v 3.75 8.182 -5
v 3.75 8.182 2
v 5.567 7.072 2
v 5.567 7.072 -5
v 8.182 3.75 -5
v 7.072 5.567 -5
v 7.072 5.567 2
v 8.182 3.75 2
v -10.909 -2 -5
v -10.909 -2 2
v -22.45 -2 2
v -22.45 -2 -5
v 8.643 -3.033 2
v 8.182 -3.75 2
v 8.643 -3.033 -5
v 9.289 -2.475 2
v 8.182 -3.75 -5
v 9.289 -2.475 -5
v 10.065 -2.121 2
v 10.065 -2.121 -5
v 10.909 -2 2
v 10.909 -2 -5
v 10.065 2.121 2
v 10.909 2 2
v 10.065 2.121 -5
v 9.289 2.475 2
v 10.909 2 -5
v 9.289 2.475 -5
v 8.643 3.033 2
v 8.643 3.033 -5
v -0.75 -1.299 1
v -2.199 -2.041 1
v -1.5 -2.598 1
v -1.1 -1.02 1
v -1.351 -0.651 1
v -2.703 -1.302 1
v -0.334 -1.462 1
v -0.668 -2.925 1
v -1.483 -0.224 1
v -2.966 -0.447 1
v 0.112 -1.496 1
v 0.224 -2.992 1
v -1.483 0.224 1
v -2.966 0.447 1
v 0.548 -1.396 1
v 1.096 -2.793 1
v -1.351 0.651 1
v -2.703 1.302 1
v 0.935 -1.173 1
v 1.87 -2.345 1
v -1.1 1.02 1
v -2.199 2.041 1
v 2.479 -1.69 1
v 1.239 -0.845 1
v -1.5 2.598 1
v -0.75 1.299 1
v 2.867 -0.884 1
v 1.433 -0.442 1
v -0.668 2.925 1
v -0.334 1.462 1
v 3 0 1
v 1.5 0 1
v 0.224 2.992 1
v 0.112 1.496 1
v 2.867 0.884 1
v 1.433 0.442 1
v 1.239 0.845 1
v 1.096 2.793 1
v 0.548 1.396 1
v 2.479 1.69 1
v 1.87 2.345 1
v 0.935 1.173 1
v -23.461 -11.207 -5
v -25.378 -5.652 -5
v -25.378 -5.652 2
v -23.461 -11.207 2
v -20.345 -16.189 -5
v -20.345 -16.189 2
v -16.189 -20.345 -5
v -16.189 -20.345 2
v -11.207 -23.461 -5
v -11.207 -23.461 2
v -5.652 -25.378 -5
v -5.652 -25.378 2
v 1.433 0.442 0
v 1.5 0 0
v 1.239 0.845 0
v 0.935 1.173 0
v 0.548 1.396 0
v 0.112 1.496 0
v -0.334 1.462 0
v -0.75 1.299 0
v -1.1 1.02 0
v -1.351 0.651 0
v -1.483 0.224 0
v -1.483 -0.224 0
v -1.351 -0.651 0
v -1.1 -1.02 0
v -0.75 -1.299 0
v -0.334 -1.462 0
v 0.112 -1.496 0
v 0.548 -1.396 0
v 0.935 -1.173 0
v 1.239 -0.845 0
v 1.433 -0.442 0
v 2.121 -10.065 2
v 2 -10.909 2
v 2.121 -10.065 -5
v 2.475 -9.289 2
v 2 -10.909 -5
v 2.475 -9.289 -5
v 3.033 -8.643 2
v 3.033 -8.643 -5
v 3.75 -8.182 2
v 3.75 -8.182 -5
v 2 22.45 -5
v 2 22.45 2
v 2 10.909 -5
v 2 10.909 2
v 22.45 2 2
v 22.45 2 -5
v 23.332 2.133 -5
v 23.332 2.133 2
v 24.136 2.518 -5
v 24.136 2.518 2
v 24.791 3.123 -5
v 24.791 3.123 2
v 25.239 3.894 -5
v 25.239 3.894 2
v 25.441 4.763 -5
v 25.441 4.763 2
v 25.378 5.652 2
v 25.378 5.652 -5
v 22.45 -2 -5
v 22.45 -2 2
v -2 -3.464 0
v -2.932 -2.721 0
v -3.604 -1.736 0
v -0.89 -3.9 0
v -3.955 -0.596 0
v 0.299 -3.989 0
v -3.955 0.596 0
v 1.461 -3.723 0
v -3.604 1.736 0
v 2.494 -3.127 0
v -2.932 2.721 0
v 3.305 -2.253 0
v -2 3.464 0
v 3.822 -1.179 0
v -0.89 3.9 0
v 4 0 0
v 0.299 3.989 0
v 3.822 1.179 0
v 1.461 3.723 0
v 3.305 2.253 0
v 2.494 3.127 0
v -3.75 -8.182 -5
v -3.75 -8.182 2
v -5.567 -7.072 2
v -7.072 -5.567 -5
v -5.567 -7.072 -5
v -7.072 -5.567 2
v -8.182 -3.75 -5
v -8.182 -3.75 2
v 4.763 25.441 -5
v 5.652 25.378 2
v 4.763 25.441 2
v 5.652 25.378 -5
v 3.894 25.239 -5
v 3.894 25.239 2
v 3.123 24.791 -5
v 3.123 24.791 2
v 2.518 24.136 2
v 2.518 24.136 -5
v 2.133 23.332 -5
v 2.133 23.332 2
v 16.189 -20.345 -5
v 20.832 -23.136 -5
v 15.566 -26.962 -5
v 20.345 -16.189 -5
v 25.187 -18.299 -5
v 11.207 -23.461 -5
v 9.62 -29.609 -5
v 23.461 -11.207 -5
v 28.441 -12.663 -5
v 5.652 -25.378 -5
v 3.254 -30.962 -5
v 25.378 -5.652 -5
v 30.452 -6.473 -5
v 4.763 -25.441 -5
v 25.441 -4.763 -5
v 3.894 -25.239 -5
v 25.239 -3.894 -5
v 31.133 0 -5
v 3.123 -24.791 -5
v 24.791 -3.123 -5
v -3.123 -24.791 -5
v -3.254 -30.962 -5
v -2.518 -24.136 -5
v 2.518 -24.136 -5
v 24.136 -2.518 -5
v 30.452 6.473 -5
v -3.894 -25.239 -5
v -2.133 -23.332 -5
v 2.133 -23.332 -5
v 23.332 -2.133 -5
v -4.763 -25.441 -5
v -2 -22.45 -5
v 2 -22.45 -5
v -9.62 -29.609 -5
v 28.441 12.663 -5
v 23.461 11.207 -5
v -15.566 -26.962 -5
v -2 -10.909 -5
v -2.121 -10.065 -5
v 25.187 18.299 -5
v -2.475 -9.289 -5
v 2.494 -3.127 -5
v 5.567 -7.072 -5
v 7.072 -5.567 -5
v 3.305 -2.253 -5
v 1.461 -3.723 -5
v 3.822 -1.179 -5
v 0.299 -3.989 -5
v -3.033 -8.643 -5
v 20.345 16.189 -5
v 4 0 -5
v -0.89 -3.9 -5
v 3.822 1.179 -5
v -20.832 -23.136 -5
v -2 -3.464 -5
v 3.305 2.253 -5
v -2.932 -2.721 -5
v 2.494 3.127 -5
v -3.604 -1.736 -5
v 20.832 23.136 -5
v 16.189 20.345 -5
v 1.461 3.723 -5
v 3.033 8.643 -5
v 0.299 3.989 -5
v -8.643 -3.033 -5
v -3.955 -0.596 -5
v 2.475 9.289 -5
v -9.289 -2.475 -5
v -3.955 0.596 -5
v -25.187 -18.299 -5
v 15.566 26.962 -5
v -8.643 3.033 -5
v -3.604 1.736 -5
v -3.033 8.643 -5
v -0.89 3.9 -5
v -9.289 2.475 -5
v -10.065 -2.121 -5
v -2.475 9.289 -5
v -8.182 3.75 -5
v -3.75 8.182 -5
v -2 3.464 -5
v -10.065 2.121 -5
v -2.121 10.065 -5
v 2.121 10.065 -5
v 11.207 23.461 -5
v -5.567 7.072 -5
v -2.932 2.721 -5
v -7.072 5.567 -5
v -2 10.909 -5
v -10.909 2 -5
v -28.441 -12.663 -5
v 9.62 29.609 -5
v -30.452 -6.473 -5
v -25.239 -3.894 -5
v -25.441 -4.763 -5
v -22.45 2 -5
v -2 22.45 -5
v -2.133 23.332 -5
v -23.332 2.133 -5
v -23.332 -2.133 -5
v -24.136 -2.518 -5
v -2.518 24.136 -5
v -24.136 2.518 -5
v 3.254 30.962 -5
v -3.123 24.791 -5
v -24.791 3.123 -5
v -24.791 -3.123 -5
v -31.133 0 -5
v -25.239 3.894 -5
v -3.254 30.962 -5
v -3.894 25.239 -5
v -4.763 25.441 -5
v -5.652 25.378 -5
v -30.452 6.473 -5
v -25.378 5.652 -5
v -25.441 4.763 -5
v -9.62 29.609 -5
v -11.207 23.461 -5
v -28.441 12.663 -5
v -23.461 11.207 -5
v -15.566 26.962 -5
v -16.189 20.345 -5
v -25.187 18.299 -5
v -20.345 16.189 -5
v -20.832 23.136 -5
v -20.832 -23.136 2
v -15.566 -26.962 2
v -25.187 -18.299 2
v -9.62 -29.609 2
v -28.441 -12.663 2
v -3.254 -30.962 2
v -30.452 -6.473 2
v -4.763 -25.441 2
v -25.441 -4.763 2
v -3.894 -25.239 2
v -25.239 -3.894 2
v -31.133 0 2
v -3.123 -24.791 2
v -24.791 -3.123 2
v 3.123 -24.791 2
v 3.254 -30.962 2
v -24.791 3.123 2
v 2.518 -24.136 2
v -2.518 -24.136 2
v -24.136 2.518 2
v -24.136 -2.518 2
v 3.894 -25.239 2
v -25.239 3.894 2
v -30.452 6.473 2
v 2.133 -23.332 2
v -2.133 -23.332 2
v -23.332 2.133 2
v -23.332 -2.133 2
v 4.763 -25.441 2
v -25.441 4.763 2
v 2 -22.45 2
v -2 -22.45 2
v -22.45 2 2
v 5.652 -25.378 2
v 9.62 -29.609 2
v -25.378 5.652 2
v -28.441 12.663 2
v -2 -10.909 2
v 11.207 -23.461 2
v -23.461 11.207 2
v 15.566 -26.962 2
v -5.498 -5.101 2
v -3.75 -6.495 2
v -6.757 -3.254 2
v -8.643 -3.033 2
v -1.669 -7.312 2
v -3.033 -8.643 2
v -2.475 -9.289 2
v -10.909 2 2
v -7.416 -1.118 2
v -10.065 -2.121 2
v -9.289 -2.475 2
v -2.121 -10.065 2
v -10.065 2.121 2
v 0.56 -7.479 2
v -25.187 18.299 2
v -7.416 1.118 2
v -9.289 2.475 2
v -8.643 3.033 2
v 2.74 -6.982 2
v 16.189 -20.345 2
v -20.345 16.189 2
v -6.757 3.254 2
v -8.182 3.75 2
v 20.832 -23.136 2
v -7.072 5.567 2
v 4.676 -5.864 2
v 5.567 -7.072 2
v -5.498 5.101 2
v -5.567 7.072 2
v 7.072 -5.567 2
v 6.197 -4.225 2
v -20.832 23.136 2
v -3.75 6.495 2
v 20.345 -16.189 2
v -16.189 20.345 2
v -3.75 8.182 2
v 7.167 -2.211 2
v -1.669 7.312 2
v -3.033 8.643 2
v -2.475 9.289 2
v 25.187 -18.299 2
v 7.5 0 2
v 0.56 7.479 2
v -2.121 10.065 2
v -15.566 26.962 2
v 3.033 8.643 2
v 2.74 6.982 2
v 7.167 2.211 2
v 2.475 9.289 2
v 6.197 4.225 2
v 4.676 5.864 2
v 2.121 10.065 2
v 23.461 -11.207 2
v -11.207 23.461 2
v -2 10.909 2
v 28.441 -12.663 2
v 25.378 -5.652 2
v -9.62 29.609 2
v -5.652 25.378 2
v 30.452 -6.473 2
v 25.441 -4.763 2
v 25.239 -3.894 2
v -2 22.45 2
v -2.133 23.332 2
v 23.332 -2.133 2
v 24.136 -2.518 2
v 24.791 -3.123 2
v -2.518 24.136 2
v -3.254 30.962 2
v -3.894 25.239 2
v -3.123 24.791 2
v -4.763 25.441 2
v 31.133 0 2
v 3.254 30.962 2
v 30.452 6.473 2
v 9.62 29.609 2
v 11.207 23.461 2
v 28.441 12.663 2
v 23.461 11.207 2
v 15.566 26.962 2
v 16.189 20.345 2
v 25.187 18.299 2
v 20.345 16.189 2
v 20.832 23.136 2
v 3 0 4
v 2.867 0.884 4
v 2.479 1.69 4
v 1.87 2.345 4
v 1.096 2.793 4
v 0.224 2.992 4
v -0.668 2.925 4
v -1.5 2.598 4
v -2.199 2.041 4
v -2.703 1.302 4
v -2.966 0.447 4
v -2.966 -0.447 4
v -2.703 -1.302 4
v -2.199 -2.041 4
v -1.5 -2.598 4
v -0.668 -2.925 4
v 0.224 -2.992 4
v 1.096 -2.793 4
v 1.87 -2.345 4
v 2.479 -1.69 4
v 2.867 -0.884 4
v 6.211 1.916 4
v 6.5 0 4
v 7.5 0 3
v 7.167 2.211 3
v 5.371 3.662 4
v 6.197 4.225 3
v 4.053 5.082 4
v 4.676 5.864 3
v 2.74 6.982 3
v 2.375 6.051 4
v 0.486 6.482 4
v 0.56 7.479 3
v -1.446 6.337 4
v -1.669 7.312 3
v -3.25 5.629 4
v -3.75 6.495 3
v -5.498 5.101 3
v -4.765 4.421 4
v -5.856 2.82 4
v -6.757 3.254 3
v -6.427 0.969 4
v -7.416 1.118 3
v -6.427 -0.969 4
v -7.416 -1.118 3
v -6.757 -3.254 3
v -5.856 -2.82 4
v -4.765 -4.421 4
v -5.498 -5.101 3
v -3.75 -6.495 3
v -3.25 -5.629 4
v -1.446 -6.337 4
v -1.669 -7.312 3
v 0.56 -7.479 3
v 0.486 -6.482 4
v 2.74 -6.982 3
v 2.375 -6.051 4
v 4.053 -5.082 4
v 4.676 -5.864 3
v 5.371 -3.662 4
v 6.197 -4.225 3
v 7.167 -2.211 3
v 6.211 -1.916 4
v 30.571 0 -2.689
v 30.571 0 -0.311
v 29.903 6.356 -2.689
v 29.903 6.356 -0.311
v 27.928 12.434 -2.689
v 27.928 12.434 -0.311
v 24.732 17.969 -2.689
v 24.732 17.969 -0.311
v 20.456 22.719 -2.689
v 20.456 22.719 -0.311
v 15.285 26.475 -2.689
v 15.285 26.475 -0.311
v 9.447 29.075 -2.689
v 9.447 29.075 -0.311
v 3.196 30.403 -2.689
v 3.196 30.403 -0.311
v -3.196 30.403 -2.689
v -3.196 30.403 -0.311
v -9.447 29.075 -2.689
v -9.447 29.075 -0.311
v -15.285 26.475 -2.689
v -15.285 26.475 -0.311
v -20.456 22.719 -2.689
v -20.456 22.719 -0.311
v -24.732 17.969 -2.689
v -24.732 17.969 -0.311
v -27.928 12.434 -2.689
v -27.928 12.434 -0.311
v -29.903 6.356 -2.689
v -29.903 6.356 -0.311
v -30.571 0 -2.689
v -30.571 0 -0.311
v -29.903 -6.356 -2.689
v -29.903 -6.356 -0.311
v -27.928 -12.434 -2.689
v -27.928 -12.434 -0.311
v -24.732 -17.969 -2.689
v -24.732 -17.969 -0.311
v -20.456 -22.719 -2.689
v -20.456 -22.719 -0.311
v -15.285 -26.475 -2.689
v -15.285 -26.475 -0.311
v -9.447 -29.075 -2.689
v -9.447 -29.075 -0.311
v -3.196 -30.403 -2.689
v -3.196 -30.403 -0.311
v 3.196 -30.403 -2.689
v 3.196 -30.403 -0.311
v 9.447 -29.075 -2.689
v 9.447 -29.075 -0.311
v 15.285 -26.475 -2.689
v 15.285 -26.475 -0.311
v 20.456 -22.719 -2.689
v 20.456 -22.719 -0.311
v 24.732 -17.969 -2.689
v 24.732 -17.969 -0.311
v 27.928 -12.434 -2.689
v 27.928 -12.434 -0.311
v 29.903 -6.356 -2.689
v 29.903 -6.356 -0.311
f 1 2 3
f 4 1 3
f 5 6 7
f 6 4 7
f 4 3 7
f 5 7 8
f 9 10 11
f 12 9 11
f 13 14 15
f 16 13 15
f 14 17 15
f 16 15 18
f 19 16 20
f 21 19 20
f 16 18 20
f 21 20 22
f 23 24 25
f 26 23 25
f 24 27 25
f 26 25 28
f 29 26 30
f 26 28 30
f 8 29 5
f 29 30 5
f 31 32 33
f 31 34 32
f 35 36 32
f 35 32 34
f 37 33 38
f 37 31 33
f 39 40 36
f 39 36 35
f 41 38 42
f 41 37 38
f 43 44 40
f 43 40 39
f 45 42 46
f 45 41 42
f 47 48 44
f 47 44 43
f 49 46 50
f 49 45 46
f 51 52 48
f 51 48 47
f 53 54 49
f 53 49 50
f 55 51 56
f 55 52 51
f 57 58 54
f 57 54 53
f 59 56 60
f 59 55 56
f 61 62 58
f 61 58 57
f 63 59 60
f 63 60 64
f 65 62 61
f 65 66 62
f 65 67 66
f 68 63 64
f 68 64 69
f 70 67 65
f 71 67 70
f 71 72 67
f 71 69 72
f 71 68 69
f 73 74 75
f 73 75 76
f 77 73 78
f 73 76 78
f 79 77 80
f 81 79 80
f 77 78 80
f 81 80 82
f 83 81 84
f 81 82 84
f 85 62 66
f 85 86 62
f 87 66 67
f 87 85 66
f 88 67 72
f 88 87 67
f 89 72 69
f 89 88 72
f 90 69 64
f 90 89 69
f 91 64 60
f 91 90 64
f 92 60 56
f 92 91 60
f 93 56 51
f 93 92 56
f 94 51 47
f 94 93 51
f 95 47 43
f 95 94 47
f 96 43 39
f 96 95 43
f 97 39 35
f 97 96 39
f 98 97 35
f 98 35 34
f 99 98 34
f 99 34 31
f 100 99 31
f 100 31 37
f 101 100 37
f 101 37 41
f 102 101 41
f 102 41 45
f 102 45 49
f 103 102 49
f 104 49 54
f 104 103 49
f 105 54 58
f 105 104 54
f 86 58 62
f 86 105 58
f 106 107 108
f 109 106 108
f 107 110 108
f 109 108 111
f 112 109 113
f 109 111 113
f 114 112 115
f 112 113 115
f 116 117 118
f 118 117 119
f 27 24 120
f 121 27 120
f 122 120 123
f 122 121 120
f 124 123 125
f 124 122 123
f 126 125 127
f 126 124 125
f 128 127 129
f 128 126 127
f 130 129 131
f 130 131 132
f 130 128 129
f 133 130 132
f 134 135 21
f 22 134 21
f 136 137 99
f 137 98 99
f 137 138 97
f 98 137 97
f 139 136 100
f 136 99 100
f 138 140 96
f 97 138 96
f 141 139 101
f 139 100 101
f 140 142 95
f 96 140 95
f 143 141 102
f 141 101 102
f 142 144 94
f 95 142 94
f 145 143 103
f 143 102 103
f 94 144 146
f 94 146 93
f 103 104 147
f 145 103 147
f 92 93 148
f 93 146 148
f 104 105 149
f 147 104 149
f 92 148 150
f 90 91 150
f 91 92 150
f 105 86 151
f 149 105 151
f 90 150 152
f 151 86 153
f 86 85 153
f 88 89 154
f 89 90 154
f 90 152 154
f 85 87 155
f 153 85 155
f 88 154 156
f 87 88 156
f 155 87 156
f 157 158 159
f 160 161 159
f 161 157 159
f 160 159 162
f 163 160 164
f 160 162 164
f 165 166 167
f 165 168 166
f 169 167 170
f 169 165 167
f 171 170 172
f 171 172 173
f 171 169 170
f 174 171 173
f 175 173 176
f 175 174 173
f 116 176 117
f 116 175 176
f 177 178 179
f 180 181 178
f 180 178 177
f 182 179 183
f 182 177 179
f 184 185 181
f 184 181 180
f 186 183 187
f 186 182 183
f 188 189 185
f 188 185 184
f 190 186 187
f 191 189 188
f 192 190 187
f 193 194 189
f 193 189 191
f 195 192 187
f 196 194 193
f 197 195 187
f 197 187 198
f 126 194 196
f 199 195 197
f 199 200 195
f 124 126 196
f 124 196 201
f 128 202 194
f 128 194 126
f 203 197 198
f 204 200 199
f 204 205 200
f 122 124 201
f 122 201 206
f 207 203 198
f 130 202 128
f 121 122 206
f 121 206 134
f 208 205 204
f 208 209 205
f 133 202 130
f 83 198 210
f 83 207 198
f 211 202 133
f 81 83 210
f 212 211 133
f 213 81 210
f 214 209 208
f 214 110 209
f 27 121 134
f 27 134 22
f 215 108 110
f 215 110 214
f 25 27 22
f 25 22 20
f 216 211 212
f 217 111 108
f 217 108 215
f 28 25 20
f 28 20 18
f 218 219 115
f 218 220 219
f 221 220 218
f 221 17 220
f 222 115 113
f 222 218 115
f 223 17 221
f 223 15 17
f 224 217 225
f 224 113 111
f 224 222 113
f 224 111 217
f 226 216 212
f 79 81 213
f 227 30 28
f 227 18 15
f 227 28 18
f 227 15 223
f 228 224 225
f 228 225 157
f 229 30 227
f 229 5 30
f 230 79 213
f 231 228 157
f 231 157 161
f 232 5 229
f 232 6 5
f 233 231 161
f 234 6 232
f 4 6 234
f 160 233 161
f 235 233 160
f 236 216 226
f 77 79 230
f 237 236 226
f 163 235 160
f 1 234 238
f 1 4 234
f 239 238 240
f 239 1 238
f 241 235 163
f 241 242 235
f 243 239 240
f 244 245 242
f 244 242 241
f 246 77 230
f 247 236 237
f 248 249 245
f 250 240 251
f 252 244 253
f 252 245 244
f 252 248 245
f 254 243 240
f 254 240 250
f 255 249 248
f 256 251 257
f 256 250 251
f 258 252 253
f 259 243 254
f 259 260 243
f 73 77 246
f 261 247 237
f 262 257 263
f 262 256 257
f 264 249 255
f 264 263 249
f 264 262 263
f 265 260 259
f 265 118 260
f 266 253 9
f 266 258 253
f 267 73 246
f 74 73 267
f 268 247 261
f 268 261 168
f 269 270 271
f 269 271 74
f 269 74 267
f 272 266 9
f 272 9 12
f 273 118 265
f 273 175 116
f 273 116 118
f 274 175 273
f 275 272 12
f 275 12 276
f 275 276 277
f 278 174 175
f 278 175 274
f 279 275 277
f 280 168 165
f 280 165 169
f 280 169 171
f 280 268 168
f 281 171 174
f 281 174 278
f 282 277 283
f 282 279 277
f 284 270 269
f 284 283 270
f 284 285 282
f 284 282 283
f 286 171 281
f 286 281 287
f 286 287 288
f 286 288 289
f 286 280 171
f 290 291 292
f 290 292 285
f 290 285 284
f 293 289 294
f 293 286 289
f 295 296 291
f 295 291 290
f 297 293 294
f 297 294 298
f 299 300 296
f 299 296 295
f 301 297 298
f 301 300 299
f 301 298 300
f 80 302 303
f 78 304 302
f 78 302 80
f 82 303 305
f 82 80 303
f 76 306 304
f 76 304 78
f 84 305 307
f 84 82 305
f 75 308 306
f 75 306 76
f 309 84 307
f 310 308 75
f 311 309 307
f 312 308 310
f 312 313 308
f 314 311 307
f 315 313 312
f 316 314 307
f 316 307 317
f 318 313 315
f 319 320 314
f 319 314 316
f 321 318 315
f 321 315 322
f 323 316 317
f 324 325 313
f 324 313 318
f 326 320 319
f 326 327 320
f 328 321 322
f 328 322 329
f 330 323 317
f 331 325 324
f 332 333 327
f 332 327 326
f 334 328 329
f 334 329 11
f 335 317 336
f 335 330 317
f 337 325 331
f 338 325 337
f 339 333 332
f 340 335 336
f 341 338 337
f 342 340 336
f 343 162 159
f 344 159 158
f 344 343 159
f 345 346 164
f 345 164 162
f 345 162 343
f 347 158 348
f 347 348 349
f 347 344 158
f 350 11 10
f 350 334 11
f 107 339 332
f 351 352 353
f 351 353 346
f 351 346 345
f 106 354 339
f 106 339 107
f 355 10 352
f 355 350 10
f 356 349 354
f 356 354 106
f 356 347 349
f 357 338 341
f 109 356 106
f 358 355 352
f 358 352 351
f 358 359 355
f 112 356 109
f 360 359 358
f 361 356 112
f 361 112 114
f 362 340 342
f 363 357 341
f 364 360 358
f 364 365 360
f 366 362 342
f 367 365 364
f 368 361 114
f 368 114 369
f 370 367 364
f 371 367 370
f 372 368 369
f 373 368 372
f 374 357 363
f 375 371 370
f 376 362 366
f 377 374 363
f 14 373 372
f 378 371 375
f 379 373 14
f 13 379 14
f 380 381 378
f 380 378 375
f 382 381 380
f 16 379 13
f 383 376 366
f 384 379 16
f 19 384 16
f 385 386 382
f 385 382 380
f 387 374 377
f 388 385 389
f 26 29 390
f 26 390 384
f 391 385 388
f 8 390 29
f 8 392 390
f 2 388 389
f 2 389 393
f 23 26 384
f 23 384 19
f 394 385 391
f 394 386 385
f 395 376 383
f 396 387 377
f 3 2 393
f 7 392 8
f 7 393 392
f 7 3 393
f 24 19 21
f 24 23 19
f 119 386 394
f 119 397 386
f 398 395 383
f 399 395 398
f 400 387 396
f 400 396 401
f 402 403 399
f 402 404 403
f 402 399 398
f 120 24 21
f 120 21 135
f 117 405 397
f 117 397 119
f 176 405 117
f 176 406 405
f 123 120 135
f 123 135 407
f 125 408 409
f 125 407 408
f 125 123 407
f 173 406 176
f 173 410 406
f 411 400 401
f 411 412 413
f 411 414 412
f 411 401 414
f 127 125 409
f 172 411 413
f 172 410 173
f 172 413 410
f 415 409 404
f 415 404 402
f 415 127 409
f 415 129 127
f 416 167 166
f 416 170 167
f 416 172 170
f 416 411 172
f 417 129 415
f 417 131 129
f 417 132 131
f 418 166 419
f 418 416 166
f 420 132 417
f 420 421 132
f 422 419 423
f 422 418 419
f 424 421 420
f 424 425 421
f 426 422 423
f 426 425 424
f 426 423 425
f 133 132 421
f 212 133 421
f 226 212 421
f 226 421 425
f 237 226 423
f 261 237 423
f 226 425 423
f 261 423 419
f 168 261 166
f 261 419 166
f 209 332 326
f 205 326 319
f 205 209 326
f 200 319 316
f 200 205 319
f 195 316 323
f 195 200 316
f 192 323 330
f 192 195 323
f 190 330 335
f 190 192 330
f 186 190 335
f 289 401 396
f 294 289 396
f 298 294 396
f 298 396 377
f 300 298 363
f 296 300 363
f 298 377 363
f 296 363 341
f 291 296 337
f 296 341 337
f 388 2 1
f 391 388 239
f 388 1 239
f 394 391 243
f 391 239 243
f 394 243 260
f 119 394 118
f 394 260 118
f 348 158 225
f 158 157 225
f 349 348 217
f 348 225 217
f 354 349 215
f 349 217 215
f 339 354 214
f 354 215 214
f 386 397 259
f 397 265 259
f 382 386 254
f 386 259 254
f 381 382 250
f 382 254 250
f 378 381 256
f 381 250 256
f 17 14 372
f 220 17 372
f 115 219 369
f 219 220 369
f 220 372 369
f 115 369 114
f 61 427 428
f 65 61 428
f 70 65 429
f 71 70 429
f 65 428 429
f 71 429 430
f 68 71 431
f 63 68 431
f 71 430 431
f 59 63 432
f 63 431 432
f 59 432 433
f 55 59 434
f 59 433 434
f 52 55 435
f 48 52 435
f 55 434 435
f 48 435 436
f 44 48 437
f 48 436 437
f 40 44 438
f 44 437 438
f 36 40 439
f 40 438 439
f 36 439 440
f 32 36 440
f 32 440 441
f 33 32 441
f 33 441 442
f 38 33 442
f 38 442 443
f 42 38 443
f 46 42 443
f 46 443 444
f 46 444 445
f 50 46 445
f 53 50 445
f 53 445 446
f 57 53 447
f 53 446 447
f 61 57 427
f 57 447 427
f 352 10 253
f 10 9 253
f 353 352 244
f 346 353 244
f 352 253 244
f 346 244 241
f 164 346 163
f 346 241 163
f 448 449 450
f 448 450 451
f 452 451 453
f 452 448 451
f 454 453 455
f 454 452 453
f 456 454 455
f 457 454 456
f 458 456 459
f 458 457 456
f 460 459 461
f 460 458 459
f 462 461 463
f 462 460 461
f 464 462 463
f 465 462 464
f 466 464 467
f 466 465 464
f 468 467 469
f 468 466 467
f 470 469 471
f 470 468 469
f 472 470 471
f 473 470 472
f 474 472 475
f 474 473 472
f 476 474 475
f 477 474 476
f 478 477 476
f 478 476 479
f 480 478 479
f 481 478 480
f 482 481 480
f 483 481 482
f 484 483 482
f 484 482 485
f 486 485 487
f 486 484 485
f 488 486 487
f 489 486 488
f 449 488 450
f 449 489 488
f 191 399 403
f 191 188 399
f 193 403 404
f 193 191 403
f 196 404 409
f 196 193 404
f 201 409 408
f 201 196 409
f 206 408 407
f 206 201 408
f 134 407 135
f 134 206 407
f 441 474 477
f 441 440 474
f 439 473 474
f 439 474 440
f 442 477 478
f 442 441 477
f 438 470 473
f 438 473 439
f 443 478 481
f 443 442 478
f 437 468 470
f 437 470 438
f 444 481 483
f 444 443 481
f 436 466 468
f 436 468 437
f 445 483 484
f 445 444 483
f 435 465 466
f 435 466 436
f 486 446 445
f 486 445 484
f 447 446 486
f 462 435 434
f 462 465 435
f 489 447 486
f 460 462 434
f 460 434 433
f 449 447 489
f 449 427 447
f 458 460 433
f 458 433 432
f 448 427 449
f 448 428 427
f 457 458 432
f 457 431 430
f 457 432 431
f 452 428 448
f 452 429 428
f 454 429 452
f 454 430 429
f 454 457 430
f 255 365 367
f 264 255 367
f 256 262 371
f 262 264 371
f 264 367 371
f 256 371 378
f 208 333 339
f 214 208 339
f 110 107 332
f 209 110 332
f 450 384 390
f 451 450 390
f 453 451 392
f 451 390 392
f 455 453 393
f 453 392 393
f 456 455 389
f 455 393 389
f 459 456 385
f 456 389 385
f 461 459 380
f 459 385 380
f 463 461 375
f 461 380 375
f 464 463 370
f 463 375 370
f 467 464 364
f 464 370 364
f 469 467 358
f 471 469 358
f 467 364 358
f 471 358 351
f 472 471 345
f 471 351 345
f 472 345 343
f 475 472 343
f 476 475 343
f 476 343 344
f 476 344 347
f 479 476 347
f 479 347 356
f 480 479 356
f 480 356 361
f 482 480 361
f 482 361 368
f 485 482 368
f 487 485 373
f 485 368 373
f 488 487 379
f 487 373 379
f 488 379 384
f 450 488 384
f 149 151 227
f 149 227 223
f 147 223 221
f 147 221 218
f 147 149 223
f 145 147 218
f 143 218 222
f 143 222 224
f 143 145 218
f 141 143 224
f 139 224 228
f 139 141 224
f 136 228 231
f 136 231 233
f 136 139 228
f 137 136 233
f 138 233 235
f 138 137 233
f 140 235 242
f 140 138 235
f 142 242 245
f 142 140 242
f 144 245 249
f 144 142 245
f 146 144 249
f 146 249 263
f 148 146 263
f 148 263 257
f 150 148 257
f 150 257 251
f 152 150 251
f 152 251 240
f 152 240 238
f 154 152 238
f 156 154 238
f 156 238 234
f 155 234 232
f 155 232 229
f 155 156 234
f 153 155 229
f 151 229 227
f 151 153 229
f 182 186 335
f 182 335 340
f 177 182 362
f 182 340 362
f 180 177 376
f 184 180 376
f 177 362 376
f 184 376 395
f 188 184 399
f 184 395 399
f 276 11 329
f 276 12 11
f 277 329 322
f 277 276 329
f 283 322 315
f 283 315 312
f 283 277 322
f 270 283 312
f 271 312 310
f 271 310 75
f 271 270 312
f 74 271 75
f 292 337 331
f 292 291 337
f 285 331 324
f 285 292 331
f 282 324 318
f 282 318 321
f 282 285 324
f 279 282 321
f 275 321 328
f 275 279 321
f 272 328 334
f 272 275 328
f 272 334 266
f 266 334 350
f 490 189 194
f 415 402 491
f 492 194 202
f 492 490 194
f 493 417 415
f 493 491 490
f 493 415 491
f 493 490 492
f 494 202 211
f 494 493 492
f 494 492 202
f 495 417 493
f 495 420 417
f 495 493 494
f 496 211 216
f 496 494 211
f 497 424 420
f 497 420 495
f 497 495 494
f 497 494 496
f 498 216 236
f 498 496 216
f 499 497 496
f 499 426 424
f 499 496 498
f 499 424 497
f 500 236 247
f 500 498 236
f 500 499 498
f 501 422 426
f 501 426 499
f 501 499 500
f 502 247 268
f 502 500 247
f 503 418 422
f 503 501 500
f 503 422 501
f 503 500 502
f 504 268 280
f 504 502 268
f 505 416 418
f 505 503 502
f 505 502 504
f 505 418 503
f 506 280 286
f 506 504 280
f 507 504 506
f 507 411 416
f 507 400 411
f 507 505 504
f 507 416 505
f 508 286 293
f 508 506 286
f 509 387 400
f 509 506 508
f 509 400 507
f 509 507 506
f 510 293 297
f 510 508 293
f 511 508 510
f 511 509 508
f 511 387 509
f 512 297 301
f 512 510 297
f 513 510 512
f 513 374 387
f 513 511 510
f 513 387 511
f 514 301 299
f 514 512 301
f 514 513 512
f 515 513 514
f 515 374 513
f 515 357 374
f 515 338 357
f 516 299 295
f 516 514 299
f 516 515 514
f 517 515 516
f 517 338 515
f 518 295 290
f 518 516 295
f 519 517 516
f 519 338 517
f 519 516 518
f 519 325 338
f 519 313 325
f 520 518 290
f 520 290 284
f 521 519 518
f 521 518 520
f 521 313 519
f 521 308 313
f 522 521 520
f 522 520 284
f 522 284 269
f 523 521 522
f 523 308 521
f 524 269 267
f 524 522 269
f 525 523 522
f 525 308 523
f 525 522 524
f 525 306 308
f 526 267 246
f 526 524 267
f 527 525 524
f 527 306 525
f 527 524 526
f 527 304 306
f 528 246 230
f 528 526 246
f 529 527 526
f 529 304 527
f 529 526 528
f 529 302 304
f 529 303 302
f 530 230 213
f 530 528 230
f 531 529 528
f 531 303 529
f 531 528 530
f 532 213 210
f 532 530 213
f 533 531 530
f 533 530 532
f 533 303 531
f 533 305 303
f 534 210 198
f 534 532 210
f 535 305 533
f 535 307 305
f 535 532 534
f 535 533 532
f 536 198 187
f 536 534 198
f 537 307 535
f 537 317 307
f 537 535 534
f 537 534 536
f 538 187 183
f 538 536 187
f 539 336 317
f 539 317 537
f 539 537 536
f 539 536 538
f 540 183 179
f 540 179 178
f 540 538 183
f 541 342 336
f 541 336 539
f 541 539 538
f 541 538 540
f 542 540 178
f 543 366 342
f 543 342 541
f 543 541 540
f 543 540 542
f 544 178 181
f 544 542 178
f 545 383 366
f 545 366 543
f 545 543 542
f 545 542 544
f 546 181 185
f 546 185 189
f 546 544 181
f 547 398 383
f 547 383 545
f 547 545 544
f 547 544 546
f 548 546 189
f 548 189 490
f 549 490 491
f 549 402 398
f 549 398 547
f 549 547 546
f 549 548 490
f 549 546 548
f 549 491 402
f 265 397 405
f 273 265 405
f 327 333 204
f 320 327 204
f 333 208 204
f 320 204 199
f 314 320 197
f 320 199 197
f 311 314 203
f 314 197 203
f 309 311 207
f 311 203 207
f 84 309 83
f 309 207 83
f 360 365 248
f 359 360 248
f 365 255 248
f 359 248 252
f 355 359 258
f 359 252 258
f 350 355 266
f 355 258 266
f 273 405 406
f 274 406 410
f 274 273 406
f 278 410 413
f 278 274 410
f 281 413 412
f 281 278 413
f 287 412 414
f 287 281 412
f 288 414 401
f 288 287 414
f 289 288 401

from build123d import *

# Parameters (mm, degrees)
F0_R             = 30
F0_R_2           = 1.5
F1_DEPTH         = 2
F2_R             = 7.5
F2_R_2           = 1.5
F3_DEPTH         = 2
F4_R             = 3
F4_R_2           = 1.5
F5_DEPTH         = 3
F6_SIZE          = 1
F7_R             = 30
F7_R_2           = 4
F8_DEPTH         = 5
F10_DEPTH        = 25
F10_COPIES_COUNT = 4
F11_R            = 3


# Not quite as in the source:
# - a pattern or mirror of a feature is missing from the dataset's text; its kind, count and spacing are read off the source's solid


with BuildPart() as f1:
    # F0 (on Top) → F1 (new body)
    with BuildSketch(Plane.XY):
        Circle(F0_R)
        Circle(F0_R_2, mode=Mode.SUBTRACT)
    extrude(amount=F1_DEPTH)

    # F2 (on face) → F3 (join)
    with BuildSketch(Plane.XY.offset(2)):
        Circle(F2_R)
        Circle(F2_R_2, mode=Mode.SUBTRACT)
    extrude(amount=F3_DEPTH)

    # F4 (on face) → F5 (cut)
    with BuildSketch(Plane.XY.offset(4)):
        Circle(F4_R)
        Circle(F4_R_2, mode=Mode.SUBTRACT)
    extrude(amount=-F5_DEPTH, mode=Mode.SUBTRACT)

    # F6
    f6_edges = [f1.edges().sort_by_distance(p)[0] for p in [
        (-7.5, 0, 4),
    ]]
    chamfer(f6_edges, length=F6_SIZE)

    # F7 (on face) → F8 (join)
    with BuildSketch(Plane(origin=(0, 0, 0), x_dir=(1, 0, 0), z_dir=(0, 0, -1))):
        Circle(F7_R)
        Circle(F7_R_2, mode=Mode.SUBTRACT)
    extrude(amount=F8_DEPTH)

    # F9 (on face) → F10 (cut)
    with BuildSketch(Plane.XY.offset(2)):
        with BuildLine():
            Line((2, -8.7749643874), (2, -25.9229627936))
            ThreePointArc((2, -25.9229627936), (18.3847763109, -18.3847763109), (25.9229627936, -2))
            Line((25.9229627936, -2), (8.7749643874, -2))
            ThreePointArc((8.7749643874, -2), (6.3639610307, -6.3639610307), (2, -8.7749643874))
        make_face()
    f10 = extrude(amount=-F10_DEPTH, mode=Mode.SUBTRACT)

    # F10_copies: F10 ×4 about axis
    f10_copies_axis = Axis((0, 0, 0), (0, 0, 1))
    for i in range(1, F10_COPIES_COUNT):
        add(f10.rotate(f10_copies_axis, i * 360 / F10_COPIES_COUNT), mode=Mode.SUBTRACT)

    # F11
    f11_edges = [f1.edges().sort_by_distance(p)[0] for p in [
        (8.774964, -2, -1.5),
        (2, -25.922963, -1.5),
        (25.922963, -2, -1.5),
        (2, -8.774964, -1.5),
        (-2, -8.774964, -1.5),
        (-2, -25.922963, -1.5),
        (-8.774964, -2, -1.5),
        (-25.922963, -2, -1.5),
        (-8.774964, 2, -1.5),
        (-25.922963, 2, -1.5),
        (-2, 25.922963, -1.5),
        (-2, 8.774964, -1.5),
        (2, 8.774964, -1.5),
        (2, 25.922963, -1.5),
        (25.922963, 2, -1.5),
        (8.774964, 2, -1.5),
    ]]
    fillet(f11_edges, radius=F11_R)

    # F12 (on Front) → F13 (revolve)
    with BuildSketch(Plane.XZ):
        with BuildLine():
            Line((31.1325030024, 2), (30, 2))
            Line((30, 2), (30, -5))
            Line((30, -5), (31.1325030024, -5))
            ThreePointArc((31.1325030024, -5), (30.5, -1.5), (31.1325030024, 2))
        make_face()
    revolve(axis=Axis((0, 0, 4), (0, 0, 1)))


solid = f1.part
